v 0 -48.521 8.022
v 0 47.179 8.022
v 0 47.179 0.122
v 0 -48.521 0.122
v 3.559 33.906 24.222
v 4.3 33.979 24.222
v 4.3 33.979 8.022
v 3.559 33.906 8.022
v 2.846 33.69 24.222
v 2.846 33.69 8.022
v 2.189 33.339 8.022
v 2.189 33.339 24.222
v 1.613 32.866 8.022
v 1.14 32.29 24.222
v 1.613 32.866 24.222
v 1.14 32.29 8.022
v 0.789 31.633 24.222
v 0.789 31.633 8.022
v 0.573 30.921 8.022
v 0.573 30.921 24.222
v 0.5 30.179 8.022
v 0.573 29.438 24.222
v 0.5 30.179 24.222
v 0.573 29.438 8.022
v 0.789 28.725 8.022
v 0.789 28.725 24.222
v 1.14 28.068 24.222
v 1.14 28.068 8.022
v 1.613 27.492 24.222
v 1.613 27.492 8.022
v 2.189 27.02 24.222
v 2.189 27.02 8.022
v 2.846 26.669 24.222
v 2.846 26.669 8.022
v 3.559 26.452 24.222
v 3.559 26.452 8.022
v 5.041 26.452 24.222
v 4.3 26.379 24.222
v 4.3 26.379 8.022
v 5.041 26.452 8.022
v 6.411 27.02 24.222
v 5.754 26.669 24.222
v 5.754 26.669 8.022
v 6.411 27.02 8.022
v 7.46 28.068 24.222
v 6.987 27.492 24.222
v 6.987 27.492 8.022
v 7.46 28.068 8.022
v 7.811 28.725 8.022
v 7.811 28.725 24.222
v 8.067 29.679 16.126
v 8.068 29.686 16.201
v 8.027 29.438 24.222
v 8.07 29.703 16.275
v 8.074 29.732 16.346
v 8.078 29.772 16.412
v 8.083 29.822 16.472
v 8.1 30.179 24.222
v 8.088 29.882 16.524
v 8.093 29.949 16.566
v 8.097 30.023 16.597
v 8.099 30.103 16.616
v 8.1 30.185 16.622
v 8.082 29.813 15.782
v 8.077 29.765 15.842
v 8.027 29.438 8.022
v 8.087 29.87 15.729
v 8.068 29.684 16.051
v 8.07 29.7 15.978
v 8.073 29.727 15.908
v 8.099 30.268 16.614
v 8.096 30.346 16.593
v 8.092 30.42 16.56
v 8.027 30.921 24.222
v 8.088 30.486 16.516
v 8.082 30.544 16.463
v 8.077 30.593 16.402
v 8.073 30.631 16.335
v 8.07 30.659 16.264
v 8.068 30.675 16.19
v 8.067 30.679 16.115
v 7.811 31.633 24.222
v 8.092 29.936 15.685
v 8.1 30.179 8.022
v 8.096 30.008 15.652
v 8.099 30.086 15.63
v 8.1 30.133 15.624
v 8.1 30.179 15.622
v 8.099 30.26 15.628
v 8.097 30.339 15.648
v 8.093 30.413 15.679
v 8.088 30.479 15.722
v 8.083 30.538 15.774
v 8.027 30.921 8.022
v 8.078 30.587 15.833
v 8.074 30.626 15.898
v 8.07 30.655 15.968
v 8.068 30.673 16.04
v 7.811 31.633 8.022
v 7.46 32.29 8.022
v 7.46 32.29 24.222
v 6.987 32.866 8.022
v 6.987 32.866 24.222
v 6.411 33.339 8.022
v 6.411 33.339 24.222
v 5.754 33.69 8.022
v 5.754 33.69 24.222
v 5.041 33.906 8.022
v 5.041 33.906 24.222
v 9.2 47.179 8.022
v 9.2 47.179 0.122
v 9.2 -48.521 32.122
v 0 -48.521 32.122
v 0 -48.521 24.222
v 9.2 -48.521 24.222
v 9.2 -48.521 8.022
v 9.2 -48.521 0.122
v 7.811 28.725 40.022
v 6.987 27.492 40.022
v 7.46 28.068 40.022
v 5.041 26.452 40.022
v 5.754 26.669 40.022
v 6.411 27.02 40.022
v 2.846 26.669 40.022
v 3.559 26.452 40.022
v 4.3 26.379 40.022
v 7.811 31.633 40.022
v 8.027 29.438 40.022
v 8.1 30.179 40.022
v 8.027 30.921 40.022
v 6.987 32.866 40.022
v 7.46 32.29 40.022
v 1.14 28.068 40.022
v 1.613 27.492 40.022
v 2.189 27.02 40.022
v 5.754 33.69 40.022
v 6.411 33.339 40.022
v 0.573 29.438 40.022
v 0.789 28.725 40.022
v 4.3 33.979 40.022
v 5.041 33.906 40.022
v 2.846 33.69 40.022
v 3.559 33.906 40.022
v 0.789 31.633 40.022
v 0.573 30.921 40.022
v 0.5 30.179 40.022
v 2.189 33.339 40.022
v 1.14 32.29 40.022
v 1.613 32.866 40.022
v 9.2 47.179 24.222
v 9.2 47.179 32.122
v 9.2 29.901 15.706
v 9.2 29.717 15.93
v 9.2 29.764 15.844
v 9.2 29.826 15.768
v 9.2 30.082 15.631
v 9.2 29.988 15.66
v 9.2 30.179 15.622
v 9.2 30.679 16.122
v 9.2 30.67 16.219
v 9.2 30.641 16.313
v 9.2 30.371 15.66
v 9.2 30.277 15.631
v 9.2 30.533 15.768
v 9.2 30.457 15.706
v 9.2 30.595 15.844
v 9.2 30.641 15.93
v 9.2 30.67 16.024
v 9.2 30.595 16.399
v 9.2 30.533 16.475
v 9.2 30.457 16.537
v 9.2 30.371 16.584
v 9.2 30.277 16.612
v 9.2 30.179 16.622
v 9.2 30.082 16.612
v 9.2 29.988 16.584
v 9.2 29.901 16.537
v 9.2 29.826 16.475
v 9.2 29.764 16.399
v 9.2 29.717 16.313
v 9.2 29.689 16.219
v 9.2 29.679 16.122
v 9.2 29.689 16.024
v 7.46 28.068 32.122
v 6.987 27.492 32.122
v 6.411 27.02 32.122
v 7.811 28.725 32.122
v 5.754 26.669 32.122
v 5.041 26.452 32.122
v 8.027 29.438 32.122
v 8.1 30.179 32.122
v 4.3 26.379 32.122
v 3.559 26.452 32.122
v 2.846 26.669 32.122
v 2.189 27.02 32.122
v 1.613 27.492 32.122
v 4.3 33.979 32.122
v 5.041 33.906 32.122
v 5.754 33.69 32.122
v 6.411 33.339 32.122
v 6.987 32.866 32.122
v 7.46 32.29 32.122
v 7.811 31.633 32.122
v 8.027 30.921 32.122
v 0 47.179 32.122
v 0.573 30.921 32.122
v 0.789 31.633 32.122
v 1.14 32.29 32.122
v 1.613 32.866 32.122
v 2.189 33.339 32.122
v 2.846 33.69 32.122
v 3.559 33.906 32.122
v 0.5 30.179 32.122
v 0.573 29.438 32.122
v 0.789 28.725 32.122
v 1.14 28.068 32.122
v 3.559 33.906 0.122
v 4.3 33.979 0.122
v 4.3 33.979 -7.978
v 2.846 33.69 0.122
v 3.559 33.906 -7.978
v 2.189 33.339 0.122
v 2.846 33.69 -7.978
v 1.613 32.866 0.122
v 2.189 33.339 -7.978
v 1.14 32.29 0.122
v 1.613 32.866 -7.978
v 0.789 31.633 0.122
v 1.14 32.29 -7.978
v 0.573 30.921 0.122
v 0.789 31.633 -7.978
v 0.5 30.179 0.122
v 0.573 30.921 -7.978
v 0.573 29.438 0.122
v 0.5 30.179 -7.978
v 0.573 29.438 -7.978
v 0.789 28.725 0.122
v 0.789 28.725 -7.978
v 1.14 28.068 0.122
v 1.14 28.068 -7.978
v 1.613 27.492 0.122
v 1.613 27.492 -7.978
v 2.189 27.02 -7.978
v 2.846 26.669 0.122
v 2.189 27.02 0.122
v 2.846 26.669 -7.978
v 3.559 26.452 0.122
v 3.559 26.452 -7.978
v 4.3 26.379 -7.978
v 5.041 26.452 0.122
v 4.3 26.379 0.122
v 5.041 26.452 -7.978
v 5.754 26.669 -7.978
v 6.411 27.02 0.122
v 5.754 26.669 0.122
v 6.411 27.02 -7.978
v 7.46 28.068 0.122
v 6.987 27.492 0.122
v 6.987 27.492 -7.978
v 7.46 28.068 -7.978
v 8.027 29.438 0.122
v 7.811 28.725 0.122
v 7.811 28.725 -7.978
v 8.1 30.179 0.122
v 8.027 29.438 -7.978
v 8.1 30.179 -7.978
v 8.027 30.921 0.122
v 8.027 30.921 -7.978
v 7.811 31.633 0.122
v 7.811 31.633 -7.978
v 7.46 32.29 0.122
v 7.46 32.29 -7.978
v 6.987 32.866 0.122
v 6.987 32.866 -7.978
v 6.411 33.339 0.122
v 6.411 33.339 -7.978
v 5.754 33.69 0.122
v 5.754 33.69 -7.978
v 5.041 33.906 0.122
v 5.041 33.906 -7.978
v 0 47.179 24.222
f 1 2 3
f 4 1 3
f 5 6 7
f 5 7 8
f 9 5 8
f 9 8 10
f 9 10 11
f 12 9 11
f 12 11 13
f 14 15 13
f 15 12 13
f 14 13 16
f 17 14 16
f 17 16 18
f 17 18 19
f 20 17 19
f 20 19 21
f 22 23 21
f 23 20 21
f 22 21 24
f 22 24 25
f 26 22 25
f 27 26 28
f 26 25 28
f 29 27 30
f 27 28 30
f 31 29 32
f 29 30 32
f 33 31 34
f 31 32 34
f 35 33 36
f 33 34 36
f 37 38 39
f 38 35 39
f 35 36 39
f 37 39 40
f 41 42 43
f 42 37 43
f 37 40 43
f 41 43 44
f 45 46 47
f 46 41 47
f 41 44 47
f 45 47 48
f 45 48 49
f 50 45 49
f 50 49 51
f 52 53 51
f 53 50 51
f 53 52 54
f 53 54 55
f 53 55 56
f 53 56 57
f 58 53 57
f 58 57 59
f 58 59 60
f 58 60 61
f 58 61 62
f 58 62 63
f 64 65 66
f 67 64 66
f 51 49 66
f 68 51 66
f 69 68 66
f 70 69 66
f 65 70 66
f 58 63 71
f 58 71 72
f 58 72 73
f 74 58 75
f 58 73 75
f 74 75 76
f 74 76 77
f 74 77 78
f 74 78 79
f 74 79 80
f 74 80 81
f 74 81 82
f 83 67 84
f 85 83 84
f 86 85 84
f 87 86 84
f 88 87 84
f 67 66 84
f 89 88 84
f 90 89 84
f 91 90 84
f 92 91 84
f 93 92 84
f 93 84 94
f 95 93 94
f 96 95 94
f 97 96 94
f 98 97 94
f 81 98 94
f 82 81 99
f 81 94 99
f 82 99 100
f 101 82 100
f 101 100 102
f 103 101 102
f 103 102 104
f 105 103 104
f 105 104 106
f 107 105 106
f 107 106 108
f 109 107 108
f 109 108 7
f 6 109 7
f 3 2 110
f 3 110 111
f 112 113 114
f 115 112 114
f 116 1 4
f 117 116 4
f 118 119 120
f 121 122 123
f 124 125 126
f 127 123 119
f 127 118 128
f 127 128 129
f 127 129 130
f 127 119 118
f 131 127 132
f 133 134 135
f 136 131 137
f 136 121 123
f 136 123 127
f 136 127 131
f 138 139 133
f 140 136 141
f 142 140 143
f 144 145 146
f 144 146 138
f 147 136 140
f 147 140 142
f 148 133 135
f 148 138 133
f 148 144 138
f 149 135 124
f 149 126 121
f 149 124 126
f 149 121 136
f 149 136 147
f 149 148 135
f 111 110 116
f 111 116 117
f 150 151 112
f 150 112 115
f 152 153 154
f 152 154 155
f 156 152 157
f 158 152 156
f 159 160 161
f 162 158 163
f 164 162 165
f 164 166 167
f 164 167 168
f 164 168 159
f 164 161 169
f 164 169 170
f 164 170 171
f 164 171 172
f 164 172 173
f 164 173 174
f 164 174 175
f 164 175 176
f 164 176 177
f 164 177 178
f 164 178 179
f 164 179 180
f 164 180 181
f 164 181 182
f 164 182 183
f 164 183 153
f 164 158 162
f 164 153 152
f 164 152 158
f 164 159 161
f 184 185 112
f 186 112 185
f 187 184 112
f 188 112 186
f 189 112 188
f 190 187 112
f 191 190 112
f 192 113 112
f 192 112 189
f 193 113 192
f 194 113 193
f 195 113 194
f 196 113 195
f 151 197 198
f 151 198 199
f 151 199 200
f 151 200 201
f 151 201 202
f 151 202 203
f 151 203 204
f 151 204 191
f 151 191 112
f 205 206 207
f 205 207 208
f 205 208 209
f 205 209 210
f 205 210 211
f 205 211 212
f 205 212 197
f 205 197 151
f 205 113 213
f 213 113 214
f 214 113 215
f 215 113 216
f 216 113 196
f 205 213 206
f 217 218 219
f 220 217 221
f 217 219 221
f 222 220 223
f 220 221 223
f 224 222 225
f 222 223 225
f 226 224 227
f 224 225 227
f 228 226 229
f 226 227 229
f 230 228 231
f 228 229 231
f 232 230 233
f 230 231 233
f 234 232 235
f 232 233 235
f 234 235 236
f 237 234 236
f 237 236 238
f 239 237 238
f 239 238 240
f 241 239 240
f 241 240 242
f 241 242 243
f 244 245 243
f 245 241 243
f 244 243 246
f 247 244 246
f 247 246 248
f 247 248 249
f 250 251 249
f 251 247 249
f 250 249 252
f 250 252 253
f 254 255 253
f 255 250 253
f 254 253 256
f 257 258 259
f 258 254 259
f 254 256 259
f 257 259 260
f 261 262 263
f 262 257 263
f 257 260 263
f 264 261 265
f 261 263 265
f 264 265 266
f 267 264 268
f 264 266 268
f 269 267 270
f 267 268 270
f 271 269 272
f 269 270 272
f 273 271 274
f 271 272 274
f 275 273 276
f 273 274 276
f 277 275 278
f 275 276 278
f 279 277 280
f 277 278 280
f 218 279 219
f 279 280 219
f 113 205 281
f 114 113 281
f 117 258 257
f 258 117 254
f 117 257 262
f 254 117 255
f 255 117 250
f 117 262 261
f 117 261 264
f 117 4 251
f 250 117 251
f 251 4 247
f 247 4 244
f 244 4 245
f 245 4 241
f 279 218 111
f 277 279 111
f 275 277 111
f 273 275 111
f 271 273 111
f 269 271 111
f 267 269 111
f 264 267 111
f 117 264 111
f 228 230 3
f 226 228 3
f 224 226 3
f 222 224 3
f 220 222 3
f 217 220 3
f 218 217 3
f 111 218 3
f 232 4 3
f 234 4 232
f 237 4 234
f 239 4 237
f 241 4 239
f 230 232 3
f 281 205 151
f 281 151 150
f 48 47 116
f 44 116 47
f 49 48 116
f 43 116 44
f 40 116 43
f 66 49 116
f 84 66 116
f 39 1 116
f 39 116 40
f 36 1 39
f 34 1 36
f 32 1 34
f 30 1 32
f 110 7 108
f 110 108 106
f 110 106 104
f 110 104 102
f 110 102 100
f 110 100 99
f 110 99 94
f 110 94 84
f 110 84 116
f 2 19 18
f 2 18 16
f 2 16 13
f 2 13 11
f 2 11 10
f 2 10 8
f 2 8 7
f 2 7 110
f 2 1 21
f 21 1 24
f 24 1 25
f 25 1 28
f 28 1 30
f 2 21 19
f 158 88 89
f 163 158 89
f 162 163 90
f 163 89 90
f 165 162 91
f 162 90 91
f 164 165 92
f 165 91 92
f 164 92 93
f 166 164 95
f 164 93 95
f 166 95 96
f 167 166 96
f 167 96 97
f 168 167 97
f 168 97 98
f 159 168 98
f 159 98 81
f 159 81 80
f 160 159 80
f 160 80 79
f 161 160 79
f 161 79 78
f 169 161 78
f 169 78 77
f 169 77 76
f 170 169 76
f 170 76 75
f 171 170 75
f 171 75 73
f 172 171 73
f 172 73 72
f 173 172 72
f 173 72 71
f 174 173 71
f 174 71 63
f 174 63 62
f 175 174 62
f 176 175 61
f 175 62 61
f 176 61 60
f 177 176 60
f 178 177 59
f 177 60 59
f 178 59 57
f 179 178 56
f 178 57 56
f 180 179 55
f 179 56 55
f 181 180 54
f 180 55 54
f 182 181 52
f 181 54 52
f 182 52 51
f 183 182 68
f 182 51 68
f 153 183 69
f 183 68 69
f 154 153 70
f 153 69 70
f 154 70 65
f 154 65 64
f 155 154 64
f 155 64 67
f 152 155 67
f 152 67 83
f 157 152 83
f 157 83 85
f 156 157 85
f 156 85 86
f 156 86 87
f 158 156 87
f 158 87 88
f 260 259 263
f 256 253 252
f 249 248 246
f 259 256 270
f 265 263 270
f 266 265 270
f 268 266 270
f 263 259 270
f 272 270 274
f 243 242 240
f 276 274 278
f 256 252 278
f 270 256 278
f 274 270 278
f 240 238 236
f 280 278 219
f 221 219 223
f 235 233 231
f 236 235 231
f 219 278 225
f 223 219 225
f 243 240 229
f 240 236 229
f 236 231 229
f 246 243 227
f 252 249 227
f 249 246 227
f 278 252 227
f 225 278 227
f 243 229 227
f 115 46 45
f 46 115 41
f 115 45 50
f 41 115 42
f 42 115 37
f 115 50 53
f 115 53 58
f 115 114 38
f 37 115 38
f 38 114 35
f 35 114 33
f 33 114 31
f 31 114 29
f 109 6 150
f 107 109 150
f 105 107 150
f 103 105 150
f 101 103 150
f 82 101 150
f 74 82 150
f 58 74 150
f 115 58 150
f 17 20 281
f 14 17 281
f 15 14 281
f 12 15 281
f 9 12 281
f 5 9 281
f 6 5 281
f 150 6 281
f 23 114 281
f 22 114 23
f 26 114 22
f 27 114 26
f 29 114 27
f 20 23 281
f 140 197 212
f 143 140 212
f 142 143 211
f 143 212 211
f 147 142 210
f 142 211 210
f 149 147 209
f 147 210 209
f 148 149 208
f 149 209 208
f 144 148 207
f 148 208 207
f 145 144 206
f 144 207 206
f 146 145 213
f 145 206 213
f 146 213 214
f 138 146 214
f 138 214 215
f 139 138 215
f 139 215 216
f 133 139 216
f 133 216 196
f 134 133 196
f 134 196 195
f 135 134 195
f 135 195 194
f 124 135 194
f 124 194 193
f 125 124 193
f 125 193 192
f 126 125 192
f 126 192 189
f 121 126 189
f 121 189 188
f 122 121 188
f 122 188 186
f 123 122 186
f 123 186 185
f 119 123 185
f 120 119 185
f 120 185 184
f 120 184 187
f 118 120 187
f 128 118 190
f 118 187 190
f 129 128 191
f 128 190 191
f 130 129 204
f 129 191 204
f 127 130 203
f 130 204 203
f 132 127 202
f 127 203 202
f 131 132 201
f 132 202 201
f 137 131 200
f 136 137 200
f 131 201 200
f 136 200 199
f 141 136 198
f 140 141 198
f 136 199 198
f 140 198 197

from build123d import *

# Parameters (mm, degrees)
SKETCH1_W                = 7.9
SKETCH1_H                = 95.7
BOSS_EXTRUDE1_DEPTH      = 9.2
SKETCH1_3_W              = 7.9
SKETCH1_3_H              = 95.7
BOSS_EXTRUDE2_DEPTH      = 9.2
BOSS_EXTRUDE3_DEPTH      = 32
BOSS_EXTRUDE3_DEPTH_BACK = 16
SKETCH2_R                = 3.8
BOSS_EXTRUDE4_DEPTH      = 0.0001
BOSS_EXTRUDE4_DEPTH_BACK = 6
SKETCH4_R                = 0.5


with BuildPart() as part:
    # Sketch1 → Boss-Extrude1 (new body)
    with BuildSketch(Plane(origin=(0, 0, 0), x_dir=(0, 0, -1), z_dir=(1, 0, 0))):
        with Locations((-28.171698113, -0.670754717)):
            Rectangle(SKETCH1_W, SKETCH1_H)
    extrude(amount=BOSS_EXTRUDE1_DEPTH)

    # Sketch1<3> → Boss-Extrude2 (add)
    with BuildSketch(Plane(origin=(0, 0, 0), x_dir=(0, 0, -1), z_dir=(1, 0, 0))):
        with Locations((-28.171698113, -0.670754717)):
            Rectangle(SKETCH1_3_W, SKETCH1_3_H)
        with Locations((-4.071698113, -0.670754717)):
            Rectangle(SKETCH1_3_W, SKETCH1_3_H)
    extrude(amount=BOSS_EXTRUDE2_DEPTH)


with BuildPart() as boss_extrude2_piece_1:
    # of the separate pieces the step leaves, piece 1, a body of its own (boss_extrude2_pieces)
    add(part.part.solids().sort_by_distance((0, 47.179245283, 8.021698113))[0])



with BuildPart() as boss_extrude2_piece_2:
    # of the separate pieces the step leaves, piece 2, a body of its own (boss_extrude2_pieces)
    add(part.part.solids().sort_by_distance((0, 47.179245283, 32.121698113))[0])


with BuildPart() as boss_extrude2_piece_1_1:
    add(boss_extrude2_piece_1.part)

    add(boss_extrude2_piece_2.part)  # Boss-Extrude3 merges Boss-Extrude2 piece 2
    # Sketch2 → Boss-Extrude3 (add, two sides: drawn at the far end of the back side and taken through both)
    with BuildSketch(Plane.XY.offset(8.021698113).offset(-BOSS_EXTRUDE3_DEPTH_BACK)):
        with Locations((4.3, 30.179245283)):
            Circle(SKETCH2_R)
    extrude(amount=BOSS_EXTRUDE3_DEPTH + BOSS_EXTRUDE3_DEPTH_BACK)

    # Sketch4 → Boss-Extrude4 (add, two sides: drawn at the far end of the back side and taken through both)
    with BuildSketch(Plane(origin=(9.2, 0, 0), x_dir=(0, 0, -1), z_dir=(1, 0, 0)).offset(-BOSS_EXTRUDE4_DEPTH_BACK)):
        with Locations((-16.121698113, 30.179245283)):
            Circle(SKETCH4_R)
    extrude(amount=BOSS_EXTRUDE4_DEPTH + BOSS_EXTRUDE4_DEPTH_BACK)


solid = boss_extrude2_piece_1_1.part
